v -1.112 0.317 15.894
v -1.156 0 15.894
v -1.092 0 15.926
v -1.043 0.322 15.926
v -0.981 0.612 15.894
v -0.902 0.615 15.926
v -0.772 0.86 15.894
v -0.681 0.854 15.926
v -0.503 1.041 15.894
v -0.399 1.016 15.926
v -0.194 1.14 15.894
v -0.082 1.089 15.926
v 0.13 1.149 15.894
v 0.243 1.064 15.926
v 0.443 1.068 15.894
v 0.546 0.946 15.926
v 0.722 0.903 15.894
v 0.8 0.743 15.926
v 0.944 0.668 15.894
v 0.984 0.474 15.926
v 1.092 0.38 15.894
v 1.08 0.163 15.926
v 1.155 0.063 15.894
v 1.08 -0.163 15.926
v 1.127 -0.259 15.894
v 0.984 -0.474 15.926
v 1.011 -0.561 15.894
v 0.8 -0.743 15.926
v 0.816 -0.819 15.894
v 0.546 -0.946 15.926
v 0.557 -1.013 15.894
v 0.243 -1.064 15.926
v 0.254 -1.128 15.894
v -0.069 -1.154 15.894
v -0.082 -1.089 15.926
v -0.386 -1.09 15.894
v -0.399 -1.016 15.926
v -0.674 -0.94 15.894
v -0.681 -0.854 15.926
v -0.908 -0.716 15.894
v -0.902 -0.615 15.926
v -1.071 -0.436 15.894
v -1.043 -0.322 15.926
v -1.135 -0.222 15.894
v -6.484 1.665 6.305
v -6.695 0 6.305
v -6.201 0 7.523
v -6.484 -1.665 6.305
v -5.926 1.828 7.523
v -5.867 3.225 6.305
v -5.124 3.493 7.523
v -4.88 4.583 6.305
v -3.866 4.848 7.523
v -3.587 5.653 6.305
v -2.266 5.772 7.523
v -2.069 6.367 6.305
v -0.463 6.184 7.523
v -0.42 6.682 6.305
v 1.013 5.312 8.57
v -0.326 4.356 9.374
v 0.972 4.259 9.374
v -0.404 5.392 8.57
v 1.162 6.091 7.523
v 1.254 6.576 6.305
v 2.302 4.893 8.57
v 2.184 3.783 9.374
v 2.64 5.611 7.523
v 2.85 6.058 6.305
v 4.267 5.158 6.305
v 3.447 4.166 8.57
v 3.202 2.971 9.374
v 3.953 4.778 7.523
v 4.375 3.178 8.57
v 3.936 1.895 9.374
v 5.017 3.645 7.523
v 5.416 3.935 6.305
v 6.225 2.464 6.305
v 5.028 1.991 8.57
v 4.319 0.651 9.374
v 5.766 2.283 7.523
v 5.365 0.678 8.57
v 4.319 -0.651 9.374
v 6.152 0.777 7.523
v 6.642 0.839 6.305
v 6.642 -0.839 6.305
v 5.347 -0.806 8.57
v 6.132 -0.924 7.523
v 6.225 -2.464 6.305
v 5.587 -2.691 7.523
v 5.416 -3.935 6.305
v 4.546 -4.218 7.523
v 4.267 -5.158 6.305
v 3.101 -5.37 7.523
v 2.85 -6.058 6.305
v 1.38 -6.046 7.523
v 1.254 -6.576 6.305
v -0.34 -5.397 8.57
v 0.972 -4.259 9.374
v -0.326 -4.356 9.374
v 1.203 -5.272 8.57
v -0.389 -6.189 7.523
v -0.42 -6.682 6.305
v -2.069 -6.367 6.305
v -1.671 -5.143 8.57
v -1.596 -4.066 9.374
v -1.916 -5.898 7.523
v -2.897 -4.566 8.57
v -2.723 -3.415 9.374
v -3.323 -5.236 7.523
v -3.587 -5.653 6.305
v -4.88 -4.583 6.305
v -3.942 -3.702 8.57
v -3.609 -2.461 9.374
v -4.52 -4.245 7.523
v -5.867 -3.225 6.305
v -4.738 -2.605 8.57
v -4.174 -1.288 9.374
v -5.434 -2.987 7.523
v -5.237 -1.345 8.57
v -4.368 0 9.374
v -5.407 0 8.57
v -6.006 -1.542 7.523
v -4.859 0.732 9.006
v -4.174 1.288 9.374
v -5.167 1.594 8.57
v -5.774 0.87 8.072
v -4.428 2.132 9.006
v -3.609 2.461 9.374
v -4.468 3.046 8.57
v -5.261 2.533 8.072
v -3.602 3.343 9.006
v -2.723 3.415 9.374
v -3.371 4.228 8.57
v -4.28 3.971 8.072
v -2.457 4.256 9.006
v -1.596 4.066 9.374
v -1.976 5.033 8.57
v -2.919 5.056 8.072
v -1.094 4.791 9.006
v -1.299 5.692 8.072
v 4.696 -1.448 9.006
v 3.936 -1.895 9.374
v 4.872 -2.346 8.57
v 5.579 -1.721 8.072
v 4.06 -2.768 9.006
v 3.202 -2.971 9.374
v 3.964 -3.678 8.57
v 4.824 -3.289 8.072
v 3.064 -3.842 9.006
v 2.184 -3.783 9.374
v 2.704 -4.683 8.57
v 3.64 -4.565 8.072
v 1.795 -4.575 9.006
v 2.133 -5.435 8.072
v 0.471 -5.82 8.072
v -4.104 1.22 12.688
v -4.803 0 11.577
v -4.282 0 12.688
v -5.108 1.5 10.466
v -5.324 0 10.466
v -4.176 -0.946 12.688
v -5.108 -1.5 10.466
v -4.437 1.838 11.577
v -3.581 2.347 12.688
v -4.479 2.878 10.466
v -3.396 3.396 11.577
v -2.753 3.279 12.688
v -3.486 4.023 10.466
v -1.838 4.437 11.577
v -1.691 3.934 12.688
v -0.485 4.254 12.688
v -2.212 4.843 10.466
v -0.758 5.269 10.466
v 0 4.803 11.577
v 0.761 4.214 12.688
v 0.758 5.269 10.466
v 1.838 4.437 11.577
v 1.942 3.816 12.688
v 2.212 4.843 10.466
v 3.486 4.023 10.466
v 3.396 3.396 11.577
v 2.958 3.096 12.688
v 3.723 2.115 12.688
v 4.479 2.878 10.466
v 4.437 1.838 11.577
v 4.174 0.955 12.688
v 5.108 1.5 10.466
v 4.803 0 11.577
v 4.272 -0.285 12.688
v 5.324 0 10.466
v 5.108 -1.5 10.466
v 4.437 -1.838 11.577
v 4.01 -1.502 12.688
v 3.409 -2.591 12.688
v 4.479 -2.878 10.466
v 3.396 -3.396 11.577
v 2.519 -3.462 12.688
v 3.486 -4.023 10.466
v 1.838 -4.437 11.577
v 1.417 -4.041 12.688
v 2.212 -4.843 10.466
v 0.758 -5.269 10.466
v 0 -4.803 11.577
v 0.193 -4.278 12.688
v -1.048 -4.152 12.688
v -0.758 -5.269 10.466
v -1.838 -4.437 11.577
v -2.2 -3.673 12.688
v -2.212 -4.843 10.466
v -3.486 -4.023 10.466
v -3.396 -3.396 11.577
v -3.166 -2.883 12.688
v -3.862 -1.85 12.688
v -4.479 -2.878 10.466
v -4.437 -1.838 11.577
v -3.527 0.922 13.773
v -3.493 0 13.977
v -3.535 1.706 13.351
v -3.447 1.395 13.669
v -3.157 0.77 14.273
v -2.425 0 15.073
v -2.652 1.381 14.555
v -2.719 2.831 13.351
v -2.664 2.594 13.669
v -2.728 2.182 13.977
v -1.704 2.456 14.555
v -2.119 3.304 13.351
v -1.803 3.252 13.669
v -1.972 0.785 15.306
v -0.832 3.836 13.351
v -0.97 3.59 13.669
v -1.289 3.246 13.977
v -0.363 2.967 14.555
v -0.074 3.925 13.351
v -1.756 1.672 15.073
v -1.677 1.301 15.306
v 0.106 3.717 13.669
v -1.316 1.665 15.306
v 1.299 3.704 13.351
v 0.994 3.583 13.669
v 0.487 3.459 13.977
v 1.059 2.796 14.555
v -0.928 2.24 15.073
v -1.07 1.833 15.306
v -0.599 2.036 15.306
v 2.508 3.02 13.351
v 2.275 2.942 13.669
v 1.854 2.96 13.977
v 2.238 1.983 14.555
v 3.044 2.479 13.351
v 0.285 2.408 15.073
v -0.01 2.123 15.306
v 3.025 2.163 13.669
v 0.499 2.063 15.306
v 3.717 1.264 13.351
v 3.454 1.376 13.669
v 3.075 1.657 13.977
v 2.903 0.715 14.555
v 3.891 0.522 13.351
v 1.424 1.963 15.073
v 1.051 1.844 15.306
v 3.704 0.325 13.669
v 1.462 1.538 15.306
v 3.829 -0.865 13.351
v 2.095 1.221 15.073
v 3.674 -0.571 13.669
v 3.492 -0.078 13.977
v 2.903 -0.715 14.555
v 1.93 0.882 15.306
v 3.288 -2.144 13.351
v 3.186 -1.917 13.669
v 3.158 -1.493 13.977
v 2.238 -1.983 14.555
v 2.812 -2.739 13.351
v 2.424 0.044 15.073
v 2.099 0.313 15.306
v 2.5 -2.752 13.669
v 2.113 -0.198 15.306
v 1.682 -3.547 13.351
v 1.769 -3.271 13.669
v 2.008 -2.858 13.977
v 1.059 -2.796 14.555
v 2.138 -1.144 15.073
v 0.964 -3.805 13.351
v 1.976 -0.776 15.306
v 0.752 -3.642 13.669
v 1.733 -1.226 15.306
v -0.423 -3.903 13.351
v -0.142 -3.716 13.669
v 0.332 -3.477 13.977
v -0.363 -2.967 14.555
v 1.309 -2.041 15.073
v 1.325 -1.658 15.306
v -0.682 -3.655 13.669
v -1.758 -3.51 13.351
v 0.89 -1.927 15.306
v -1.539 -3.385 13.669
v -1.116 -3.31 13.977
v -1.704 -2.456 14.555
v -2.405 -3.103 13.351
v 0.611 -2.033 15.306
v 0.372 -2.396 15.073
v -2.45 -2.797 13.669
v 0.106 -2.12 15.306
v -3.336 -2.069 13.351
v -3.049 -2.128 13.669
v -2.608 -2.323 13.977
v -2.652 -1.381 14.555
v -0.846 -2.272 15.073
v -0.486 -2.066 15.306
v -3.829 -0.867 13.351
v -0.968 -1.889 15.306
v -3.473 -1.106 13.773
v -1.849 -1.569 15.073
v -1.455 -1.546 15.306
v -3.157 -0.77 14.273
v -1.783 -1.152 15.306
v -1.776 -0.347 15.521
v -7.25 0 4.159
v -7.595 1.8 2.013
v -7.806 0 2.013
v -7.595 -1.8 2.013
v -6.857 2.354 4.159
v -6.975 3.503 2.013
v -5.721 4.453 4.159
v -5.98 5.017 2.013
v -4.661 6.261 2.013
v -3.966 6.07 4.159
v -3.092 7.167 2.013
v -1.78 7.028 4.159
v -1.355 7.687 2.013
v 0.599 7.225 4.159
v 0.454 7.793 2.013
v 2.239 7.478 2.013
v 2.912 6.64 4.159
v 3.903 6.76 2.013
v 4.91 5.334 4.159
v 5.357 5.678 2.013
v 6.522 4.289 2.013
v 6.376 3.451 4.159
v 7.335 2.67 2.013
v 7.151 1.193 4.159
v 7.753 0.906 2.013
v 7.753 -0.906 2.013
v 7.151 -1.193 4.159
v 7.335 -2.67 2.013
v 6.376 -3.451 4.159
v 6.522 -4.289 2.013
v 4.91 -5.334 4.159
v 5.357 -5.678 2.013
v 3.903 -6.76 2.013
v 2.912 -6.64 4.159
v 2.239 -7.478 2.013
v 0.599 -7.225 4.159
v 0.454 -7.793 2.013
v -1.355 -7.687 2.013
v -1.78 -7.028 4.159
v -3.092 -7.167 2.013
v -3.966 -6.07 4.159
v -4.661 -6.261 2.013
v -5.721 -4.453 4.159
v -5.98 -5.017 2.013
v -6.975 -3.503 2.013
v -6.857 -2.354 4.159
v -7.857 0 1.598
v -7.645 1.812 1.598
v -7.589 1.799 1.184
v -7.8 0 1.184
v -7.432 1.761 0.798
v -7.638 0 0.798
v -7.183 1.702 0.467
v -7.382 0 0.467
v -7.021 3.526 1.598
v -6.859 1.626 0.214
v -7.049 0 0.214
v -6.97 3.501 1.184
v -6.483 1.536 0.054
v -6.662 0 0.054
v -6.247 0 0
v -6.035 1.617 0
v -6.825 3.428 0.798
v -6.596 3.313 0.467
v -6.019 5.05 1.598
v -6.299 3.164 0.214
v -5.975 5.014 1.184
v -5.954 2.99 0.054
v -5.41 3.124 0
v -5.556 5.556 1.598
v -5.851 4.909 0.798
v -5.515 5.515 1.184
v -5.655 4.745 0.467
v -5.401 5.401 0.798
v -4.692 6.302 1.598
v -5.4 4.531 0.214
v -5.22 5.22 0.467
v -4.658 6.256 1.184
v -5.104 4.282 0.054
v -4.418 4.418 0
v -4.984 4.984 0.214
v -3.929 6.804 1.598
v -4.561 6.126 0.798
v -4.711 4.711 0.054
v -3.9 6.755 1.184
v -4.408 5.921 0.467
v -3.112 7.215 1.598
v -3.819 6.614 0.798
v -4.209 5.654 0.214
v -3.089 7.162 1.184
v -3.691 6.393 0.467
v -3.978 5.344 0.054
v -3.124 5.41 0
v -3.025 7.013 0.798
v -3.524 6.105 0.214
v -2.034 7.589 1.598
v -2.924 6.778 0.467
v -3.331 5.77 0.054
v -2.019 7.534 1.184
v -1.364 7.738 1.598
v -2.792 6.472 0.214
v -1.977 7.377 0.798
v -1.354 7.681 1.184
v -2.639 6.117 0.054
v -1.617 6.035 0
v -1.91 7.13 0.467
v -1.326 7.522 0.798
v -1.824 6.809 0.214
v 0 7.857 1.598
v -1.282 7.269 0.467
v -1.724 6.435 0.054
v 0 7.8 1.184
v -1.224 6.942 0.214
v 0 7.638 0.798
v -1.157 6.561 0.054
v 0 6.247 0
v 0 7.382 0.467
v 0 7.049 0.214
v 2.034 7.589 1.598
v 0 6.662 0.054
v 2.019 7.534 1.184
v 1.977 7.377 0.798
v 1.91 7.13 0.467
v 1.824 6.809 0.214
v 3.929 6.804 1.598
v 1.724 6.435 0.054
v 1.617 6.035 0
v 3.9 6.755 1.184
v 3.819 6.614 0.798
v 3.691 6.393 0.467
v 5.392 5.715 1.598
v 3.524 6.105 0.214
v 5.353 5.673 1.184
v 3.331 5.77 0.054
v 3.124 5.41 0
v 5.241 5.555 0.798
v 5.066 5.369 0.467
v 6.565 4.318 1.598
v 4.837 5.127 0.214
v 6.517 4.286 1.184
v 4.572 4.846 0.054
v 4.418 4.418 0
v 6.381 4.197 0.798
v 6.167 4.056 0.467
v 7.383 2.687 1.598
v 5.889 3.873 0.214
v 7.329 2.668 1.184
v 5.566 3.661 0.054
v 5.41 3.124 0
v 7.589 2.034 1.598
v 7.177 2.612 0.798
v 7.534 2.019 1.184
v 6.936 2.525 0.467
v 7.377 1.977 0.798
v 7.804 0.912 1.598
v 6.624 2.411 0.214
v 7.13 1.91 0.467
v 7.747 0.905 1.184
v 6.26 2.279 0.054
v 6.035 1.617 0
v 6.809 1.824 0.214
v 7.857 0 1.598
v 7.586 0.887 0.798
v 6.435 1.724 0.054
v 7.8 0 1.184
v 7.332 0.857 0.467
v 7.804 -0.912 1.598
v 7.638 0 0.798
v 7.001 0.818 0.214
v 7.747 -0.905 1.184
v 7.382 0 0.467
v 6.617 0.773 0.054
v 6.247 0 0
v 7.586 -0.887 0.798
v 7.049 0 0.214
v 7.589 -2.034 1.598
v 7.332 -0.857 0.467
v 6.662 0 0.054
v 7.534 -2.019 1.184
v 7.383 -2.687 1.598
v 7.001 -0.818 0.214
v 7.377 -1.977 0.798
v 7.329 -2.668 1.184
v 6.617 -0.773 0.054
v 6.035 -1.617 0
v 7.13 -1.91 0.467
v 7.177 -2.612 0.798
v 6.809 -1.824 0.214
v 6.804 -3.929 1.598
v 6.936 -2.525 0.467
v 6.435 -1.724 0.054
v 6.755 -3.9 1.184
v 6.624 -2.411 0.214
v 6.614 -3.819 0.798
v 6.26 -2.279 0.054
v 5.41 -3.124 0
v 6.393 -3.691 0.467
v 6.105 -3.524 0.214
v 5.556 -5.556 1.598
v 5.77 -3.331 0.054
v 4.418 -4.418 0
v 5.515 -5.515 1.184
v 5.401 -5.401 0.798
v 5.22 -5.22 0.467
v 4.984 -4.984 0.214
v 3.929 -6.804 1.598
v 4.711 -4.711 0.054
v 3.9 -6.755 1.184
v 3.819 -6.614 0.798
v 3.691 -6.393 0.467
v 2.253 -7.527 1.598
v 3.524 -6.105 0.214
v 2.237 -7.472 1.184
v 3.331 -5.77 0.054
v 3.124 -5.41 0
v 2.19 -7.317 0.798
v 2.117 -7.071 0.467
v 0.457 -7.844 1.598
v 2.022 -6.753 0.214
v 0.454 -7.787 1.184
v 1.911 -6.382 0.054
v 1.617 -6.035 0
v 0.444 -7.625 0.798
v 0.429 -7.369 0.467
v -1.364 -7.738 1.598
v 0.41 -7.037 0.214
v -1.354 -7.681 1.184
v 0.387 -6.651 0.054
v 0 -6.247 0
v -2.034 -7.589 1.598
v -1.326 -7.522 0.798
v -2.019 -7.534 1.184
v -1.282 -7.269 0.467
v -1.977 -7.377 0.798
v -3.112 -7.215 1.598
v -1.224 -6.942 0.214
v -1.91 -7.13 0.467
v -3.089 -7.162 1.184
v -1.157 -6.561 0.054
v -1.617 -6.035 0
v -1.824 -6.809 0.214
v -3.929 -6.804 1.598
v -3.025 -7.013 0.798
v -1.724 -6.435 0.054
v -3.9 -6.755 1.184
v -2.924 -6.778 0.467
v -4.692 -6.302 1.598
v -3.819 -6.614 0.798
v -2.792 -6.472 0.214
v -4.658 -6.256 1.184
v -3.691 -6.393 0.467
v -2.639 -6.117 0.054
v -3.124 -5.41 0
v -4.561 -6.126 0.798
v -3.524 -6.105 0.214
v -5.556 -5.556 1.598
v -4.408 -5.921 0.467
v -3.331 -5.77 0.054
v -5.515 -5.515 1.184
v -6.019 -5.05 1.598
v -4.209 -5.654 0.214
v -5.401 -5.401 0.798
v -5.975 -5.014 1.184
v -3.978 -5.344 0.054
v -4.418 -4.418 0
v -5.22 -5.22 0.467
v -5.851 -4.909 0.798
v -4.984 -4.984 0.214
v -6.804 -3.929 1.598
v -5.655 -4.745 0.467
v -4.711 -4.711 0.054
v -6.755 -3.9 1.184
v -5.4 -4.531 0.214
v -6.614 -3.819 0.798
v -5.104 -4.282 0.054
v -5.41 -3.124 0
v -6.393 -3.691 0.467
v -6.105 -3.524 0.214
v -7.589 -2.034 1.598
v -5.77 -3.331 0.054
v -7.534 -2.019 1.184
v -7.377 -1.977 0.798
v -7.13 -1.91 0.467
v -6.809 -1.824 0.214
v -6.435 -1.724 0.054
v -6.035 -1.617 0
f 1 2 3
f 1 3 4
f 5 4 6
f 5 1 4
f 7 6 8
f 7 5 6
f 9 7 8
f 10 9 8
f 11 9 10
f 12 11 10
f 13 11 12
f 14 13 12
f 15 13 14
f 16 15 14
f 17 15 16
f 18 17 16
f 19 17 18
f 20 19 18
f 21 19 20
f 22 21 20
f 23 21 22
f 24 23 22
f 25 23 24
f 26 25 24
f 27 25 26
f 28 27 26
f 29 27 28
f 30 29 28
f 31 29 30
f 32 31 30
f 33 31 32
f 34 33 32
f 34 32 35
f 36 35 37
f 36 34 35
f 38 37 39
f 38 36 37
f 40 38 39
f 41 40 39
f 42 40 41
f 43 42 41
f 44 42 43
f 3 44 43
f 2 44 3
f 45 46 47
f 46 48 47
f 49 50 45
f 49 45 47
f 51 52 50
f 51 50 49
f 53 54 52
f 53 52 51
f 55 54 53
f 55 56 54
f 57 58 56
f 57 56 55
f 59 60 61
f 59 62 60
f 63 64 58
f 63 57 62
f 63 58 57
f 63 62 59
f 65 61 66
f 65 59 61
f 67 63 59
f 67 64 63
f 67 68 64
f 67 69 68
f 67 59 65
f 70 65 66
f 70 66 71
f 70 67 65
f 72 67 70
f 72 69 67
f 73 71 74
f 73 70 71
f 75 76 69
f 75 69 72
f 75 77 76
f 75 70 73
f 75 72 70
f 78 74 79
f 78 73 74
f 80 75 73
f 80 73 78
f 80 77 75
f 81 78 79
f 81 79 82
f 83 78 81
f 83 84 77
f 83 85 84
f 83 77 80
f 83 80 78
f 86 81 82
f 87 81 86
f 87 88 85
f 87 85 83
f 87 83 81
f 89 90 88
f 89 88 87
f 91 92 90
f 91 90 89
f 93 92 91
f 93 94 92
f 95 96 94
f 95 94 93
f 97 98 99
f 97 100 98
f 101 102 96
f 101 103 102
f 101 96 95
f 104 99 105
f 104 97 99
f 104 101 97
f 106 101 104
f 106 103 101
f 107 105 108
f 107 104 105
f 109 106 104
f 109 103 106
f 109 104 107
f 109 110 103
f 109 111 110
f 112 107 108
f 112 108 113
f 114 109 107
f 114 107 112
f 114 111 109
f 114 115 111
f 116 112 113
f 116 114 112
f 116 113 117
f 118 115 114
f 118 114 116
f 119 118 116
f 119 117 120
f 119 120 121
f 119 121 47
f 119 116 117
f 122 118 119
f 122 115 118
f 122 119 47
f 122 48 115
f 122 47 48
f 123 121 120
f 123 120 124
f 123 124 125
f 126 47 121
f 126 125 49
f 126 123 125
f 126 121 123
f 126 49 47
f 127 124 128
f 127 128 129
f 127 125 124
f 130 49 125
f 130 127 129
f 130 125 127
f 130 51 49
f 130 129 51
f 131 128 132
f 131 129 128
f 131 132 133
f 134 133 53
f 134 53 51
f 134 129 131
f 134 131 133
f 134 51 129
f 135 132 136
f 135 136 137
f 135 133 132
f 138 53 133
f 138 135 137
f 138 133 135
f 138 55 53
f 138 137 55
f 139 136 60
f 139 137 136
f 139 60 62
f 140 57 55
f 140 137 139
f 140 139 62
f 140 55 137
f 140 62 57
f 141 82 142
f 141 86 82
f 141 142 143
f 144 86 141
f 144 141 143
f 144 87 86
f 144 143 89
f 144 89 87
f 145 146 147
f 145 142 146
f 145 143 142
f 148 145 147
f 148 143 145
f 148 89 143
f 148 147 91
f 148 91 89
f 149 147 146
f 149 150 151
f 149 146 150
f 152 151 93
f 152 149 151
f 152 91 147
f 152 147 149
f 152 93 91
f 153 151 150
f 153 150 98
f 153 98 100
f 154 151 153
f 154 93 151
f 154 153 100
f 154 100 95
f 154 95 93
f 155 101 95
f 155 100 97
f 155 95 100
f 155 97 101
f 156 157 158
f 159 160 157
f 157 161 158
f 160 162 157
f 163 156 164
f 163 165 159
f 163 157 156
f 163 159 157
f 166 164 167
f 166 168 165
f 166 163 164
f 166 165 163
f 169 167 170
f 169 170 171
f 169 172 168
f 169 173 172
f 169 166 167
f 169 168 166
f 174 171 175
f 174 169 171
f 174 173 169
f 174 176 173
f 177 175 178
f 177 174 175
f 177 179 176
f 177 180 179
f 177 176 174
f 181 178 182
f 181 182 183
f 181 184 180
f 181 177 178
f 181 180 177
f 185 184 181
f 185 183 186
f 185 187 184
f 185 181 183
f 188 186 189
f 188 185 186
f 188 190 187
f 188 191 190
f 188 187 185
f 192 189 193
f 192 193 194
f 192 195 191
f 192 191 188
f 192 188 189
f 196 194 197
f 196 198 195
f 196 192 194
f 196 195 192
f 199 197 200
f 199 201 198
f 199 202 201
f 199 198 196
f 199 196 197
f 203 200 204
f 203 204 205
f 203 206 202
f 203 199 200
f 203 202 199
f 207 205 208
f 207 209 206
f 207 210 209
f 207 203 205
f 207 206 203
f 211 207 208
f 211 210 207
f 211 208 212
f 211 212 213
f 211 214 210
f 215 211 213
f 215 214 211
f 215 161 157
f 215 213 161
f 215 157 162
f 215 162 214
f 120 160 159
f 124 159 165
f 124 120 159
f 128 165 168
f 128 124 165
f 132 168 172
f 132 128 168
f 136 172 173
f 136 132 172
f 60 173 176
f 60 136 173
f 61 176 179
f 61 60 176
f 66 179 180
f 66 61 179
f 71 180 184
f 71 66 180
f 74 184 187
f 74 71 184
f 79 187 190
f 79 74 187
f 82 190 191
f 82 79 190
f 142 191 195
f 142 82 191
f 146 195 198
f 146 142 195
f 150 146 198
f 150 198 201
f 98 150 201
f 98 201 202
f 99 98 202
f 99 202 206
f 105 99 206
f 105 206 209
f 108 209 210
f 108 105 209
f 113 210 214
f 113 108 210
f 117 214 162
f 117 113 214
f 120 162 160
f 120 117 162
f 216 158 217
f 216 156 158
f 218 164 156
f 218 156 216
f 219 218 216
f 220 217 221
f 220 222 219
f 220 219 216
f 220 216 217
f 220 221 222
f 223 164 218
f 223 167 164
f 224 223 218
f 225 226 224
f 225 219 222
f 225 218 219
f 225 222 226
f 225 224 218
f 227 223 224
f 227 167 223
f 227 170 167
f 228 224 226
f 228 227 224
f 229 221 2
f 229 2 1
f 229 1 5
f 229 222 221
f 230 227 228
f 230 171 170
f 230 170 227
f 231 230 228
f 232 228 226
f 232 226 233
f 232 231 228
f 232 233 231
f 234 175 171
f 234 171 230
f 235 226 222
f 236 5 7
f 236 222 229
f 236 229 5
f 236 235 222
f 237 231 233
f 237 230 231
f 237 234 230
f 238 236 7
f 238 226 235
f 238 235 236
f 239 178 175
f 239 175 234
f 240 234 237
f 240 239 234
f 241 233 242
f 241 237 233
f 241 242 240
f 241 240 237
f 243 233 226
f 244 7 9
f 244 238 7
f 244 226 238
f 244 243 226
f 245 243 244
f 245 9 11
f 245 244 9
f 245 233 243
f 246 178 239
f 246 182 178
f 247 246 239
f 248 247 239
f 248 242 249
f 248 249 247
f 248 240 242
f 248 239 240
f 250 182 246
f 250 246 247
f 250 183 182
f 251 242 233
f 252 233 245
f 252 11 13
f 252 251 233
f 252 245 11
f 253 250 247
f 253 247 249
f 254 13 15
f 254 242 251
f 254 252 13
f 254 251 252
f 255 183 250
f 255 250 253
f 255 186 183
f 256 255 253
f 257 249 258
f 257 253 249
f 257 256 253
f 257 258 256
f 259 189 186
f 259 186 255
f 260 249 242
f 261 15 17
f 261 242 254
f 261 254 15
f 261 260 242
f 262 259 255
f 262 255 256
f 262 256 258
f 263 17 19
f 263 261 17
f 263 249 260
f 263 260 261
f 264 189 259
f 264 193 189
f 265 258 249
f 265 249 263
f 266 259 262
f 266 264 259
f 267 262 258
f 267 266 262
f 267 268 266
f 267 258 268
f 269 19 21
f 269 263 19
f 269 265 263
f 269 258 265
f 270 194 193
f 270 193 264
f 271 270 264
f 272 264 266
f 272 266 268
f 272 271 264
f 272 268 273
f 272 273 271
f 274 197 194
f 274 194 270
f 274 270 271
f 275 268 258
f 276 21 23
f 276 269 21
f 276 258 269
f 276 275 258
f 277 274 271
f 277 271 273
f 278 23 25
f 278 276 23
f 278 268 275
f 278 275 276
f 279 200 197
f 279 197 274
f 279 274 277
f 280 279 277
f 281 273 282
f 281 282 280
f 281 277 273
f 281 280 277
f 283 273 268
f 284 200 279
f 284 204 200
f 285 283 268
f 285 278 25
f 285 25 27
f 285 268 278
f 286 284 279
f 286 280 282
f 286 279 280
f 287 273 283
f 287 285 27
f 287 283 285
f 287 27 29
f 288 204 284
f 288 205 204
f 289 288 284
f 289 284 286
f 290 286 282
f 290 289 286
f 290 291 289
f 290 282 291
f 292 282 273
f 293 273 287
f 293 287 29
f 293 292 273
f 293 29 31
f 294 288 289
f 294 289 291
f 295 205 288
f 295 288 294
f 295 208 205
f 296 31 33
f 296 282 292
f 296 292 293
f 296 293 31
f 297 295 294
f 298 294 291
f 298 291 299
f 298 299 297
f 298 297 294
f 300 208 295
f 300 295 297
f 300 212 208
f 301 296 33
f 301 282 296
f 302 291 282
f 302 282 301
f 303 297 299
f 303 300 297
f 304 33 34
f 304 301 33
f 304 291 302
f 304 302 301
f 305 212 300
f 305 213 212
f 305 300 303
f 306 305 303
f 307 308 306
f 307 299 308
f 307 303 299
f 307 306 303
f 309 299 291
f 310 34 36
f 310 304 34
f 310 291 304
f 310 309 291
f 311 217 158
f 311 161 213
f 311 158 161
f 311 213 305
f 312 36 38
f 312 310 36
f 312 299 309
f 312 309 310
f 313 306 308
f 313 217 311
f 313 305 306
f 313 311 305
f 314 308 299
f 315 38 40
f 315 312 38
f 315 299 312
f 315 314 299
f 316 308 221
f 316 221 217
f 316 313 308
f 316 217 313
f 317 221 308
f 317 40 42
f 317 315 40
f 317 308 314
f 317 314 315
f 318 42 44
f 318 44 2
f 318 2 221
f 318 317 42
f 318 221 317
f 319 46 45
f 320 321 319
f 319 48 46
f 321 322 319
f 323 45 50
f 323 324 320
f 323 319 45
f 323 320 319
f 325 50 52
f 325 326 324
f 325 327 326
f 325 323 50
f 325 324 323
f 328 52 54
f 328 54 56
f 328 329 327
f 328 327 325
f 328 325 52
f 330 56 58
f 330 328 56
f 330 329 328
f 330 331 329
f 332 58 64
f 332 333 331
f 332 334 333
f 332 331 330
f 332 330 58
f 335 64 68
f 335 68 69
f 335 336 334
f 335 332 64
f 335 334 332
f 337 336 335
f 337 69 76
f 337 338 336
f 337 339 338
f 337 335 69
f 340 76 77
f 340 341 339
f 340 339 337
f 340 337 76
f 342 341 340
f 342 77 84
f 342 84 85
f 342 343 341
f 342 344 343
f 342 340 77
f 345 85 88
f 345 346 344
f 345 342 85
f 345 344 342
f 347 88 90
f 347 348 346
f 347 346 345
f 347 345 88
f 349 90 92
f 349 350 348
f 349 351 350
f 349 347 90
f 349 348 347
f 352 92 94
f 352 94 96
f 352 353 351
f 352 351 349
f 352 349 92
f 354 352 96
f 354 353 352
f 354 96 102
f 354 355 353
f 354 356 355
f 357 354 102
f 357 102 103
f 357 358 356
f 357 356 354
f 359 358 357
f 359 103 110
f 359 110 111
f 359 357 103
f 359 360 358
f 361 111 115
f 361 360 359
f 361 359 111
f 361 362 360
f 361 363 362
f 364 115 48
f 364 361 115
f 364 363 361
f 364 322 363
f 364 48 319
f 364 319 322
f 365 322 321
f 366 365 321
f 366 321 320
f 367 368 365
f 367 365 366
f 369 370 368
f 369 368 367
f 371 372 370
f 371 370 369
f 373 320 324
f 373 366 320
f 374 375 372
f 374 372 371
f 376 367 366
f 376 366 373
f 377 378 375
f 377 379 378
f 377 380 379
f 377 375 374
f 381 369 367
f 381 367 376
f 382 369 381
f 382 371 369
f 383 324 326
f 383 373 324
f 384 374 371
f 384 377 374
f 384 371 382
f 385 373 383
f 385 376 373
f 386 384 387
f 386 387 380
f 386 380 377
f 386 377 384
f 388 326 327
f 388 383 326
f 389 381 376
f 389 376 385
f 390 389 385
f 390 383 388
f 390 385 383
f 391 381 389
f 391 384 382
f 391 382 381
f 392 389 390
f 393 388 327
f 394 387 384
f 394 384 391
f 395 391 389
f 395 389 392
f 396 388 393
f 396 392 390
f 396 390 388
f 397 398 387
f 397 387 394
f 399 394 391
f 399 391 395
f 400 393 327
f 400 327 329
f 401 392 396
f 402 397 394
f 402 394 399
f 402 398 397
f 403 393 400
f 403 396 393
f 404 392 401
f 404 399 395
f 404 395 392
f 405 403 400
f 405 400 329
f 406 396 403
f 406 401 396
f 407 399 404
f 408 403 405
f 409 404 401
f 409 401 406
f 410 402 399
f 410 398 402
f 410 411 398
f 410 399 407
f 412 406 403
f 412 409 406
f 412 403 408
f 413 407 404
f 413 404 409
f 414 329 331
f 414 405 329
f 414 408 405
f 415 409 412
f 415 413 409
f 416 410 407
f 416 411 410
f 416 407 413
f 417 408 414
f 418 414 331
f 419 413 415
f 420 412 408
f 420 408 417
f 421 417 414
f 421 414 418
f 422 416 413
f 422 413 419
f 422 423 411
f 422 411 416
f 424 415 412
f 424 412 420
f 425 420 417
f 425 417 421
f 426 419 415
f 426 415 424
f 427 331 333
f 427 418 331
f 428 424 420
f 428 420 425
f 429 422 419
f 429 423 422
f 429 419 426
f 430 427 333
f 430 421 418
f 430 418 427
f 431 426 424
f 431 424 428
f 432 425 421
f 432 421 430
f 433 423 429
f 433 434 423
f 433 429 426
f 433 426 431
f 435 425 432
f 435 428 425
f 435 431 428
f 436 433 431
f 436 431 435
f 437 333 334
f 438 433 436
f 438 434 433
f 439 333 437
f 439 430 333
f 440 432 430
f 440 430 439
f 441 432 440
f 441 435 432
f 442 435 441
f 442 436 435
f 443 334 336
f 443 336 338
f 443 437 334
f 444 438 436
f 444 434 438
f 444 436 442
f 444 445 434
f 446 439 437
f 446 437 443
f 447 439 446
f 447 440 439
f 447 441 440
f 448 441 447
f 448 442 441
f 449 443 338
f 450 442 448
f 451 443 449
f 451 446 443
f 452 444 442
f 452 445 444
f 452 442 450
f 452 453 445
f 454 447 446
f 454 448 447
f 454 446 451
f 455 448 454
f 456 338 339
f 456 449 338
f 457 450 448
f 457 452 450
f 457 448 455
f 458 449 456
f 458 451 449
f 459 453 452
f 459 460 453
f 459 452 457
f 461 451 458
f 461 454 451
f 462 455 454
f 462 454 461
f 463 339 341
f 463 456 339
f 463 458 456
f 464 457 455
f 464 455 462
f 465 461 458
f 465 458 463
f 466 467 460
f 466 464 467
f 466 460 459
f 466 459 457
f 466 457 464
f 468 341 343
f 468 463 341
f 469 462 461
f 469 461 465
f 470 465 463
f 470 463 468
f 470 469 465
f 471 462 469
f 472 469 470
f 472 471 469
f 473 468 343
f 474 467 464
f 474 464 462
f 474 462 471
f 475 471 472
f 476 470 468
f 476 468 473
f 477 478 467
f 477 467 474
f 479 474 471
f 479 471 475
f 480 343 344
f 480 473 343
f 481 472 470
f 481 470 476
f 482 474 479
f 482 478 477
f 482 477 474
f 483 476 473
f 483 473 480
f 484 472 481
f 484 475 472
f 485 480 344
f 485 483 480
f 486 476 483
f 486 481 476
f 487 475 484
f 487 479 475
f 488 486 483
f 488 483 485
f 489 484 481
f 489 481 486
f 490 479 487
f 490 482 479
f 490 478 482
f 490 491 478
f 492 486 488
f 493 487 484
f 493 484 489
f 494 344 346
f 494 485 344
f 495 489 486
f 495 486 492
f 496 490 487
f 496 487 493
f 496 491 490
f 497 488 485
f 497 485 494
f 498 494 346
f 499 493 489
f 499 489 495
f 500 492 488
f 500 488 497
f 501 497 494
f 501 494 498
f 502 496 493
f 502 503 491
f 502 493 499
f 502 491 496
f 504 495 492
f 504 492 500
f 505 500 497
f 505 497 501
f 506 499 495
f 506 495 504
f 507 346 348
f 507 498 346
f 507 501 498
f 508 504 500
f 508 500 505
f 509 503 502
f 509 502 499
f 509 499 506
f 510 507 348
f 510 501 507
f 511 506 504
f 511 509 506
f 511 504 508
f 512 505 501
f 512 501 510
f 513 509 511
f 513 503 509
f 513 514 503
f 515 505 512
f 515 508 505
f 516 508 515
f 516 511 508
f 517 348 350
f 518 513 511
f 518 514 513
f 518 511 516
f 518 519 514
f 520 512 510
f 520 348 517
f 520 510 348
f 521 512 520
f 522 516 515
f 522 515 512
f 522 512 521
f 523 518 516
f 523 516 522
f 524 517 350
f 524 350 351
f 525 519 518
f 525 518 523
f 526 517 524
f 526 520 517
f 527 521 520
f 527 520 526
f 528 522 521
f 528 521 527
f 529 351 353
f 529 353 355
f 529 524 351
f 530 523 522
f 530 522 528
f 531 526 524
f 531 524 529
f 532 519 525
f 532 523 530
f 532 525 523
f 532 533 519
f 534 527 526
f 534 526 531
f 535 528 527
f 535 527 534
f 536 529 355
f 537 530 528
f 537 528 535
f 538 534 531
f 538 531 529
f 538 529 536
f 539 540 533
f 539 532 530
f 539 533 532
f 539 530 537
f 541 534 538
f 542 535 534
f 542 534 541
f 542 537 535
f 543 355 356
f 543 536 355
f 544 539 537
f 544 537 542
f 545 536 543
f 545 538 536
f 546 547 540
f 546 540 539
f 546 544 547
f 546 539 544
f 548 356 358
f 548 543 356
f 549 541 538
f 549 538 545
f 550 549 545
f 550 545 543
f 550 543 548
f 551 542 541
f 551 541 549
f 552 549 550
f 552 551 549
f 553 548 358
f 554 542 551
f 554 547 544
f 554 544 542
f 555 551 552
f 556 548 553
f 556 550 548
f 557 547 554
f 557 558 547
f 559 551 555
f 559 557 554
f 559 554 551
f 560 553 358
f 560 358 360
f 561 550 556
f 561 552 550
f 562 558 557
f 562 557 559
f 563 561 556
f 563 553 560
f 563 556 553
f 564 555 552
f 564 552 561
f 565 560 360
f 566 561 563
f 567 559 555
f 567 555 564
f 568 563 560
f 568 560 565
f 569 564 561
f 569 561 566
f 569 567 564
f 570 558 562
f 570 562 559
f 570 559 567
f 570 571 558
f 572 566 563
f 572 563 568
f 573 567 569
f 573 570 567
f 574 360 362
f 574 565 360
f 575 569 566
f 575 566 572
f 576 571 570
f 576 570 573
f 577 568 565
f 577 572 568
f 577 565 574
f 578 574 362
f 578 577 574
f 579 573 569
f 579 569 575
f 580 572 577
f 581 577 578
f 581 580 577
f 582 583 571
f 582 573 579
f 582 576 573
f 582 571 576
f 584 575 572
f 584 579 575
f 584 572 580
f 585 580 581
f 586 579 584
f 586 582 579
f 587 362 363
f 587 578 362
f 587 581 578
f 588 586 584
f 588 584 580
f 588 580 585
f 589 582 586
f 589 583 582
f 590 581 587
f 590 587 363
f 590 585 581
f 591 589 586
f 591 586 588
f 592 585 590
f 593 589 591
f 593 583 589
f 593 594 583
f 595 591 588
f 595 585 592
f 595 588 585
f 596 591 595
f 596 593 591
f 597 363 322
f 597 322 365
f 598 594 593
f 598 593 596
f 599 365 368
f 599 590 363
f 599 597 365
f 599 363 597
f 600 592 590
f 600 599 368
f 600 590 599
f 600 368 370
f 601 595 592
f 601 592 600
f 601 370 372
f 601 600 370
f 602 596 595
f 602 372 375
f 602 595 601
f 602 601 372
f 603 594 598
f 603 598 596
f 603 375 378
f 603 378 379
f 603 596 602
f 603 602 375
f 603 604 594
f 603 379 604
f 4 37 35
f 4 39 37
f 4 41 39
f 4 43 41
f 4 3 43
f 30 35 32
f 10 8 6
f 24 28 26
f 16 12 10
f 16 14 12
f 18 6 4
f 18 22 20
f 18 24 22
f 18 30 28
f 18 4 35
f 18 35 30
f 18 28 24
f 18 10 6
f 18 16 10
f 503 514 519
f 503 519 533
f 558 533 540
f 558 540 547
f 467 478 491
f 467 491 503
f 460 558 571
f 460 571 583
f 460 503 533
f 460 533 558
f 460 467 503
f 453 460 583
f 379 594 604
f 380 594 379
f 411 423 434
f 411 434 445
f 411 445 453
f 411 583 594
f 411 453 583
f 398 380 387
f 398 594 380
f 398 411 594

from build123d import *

# Parameters (mm, degrees)
F3_R = 6.8209108122
F4_R = 1.6096783158


# Not quite as in the source:
# - a fillet or chamfer that OpenCascade refuses, or shapes differently, is made with other operations: its cross-section is extruded or revolved along the edge and cut away or added


with BuildPart() as f1:
    # F0 (on Front) → F1 (revolve)
    with BuildSketch(Plane.XZ):
        Polygon((-8.3269113675, 0), (0, 0), (0, 15.9264262766), (-1.0918058688, 15.9264262766), (-3.2759886235, 14.8343360052), (-5.3236596286, 10.4659702629), (-4.3680798262, 9.3738790601), (-6.006217096, 8.9643457904), align=None)
    revolve(axis=Axis((0, 0, 7.9632131383), (0, 0, -1)))

    # F2: fillet of radius 5 on 1 edges, made by hand

    # F2_s1 → F2_t2 (revolve, cut)
    with BuildSketch(Plane.XZ):
        with BuildLine():
            ThreePointArc((-4.3680798262, 9.3738790601), (-5.8387408469, 8.0723577213), (-6.6947110993, 6.3048406604))
            Line((-6.6947110993, 6.3048406604), (-6.006217096, 8.9643457904))
            Line((-6.006217096, 8.9643457904), (-4.3680798262, 9.3738790601))
        make_face()
    revolve(axis=Axis((0, 0, 8.9643457904), (0, 0, -1)), mode=Mode.SUBTRACT)

    # F3
    f3_edges = [f1.edges().sort_by_distance(p)[0] for p in [
        (3.275989, 0, 14.834336),
    ]]
    fillet(f3_edges, radius=F3_R)

    # F4
    f4_edges = [f1.edges().sort_by_distance(p)[0] for p in [
        (8.326911, 0, 0),
    ]]
    fillet(f4_edges, radius=F4_R)


solid = f1.part
